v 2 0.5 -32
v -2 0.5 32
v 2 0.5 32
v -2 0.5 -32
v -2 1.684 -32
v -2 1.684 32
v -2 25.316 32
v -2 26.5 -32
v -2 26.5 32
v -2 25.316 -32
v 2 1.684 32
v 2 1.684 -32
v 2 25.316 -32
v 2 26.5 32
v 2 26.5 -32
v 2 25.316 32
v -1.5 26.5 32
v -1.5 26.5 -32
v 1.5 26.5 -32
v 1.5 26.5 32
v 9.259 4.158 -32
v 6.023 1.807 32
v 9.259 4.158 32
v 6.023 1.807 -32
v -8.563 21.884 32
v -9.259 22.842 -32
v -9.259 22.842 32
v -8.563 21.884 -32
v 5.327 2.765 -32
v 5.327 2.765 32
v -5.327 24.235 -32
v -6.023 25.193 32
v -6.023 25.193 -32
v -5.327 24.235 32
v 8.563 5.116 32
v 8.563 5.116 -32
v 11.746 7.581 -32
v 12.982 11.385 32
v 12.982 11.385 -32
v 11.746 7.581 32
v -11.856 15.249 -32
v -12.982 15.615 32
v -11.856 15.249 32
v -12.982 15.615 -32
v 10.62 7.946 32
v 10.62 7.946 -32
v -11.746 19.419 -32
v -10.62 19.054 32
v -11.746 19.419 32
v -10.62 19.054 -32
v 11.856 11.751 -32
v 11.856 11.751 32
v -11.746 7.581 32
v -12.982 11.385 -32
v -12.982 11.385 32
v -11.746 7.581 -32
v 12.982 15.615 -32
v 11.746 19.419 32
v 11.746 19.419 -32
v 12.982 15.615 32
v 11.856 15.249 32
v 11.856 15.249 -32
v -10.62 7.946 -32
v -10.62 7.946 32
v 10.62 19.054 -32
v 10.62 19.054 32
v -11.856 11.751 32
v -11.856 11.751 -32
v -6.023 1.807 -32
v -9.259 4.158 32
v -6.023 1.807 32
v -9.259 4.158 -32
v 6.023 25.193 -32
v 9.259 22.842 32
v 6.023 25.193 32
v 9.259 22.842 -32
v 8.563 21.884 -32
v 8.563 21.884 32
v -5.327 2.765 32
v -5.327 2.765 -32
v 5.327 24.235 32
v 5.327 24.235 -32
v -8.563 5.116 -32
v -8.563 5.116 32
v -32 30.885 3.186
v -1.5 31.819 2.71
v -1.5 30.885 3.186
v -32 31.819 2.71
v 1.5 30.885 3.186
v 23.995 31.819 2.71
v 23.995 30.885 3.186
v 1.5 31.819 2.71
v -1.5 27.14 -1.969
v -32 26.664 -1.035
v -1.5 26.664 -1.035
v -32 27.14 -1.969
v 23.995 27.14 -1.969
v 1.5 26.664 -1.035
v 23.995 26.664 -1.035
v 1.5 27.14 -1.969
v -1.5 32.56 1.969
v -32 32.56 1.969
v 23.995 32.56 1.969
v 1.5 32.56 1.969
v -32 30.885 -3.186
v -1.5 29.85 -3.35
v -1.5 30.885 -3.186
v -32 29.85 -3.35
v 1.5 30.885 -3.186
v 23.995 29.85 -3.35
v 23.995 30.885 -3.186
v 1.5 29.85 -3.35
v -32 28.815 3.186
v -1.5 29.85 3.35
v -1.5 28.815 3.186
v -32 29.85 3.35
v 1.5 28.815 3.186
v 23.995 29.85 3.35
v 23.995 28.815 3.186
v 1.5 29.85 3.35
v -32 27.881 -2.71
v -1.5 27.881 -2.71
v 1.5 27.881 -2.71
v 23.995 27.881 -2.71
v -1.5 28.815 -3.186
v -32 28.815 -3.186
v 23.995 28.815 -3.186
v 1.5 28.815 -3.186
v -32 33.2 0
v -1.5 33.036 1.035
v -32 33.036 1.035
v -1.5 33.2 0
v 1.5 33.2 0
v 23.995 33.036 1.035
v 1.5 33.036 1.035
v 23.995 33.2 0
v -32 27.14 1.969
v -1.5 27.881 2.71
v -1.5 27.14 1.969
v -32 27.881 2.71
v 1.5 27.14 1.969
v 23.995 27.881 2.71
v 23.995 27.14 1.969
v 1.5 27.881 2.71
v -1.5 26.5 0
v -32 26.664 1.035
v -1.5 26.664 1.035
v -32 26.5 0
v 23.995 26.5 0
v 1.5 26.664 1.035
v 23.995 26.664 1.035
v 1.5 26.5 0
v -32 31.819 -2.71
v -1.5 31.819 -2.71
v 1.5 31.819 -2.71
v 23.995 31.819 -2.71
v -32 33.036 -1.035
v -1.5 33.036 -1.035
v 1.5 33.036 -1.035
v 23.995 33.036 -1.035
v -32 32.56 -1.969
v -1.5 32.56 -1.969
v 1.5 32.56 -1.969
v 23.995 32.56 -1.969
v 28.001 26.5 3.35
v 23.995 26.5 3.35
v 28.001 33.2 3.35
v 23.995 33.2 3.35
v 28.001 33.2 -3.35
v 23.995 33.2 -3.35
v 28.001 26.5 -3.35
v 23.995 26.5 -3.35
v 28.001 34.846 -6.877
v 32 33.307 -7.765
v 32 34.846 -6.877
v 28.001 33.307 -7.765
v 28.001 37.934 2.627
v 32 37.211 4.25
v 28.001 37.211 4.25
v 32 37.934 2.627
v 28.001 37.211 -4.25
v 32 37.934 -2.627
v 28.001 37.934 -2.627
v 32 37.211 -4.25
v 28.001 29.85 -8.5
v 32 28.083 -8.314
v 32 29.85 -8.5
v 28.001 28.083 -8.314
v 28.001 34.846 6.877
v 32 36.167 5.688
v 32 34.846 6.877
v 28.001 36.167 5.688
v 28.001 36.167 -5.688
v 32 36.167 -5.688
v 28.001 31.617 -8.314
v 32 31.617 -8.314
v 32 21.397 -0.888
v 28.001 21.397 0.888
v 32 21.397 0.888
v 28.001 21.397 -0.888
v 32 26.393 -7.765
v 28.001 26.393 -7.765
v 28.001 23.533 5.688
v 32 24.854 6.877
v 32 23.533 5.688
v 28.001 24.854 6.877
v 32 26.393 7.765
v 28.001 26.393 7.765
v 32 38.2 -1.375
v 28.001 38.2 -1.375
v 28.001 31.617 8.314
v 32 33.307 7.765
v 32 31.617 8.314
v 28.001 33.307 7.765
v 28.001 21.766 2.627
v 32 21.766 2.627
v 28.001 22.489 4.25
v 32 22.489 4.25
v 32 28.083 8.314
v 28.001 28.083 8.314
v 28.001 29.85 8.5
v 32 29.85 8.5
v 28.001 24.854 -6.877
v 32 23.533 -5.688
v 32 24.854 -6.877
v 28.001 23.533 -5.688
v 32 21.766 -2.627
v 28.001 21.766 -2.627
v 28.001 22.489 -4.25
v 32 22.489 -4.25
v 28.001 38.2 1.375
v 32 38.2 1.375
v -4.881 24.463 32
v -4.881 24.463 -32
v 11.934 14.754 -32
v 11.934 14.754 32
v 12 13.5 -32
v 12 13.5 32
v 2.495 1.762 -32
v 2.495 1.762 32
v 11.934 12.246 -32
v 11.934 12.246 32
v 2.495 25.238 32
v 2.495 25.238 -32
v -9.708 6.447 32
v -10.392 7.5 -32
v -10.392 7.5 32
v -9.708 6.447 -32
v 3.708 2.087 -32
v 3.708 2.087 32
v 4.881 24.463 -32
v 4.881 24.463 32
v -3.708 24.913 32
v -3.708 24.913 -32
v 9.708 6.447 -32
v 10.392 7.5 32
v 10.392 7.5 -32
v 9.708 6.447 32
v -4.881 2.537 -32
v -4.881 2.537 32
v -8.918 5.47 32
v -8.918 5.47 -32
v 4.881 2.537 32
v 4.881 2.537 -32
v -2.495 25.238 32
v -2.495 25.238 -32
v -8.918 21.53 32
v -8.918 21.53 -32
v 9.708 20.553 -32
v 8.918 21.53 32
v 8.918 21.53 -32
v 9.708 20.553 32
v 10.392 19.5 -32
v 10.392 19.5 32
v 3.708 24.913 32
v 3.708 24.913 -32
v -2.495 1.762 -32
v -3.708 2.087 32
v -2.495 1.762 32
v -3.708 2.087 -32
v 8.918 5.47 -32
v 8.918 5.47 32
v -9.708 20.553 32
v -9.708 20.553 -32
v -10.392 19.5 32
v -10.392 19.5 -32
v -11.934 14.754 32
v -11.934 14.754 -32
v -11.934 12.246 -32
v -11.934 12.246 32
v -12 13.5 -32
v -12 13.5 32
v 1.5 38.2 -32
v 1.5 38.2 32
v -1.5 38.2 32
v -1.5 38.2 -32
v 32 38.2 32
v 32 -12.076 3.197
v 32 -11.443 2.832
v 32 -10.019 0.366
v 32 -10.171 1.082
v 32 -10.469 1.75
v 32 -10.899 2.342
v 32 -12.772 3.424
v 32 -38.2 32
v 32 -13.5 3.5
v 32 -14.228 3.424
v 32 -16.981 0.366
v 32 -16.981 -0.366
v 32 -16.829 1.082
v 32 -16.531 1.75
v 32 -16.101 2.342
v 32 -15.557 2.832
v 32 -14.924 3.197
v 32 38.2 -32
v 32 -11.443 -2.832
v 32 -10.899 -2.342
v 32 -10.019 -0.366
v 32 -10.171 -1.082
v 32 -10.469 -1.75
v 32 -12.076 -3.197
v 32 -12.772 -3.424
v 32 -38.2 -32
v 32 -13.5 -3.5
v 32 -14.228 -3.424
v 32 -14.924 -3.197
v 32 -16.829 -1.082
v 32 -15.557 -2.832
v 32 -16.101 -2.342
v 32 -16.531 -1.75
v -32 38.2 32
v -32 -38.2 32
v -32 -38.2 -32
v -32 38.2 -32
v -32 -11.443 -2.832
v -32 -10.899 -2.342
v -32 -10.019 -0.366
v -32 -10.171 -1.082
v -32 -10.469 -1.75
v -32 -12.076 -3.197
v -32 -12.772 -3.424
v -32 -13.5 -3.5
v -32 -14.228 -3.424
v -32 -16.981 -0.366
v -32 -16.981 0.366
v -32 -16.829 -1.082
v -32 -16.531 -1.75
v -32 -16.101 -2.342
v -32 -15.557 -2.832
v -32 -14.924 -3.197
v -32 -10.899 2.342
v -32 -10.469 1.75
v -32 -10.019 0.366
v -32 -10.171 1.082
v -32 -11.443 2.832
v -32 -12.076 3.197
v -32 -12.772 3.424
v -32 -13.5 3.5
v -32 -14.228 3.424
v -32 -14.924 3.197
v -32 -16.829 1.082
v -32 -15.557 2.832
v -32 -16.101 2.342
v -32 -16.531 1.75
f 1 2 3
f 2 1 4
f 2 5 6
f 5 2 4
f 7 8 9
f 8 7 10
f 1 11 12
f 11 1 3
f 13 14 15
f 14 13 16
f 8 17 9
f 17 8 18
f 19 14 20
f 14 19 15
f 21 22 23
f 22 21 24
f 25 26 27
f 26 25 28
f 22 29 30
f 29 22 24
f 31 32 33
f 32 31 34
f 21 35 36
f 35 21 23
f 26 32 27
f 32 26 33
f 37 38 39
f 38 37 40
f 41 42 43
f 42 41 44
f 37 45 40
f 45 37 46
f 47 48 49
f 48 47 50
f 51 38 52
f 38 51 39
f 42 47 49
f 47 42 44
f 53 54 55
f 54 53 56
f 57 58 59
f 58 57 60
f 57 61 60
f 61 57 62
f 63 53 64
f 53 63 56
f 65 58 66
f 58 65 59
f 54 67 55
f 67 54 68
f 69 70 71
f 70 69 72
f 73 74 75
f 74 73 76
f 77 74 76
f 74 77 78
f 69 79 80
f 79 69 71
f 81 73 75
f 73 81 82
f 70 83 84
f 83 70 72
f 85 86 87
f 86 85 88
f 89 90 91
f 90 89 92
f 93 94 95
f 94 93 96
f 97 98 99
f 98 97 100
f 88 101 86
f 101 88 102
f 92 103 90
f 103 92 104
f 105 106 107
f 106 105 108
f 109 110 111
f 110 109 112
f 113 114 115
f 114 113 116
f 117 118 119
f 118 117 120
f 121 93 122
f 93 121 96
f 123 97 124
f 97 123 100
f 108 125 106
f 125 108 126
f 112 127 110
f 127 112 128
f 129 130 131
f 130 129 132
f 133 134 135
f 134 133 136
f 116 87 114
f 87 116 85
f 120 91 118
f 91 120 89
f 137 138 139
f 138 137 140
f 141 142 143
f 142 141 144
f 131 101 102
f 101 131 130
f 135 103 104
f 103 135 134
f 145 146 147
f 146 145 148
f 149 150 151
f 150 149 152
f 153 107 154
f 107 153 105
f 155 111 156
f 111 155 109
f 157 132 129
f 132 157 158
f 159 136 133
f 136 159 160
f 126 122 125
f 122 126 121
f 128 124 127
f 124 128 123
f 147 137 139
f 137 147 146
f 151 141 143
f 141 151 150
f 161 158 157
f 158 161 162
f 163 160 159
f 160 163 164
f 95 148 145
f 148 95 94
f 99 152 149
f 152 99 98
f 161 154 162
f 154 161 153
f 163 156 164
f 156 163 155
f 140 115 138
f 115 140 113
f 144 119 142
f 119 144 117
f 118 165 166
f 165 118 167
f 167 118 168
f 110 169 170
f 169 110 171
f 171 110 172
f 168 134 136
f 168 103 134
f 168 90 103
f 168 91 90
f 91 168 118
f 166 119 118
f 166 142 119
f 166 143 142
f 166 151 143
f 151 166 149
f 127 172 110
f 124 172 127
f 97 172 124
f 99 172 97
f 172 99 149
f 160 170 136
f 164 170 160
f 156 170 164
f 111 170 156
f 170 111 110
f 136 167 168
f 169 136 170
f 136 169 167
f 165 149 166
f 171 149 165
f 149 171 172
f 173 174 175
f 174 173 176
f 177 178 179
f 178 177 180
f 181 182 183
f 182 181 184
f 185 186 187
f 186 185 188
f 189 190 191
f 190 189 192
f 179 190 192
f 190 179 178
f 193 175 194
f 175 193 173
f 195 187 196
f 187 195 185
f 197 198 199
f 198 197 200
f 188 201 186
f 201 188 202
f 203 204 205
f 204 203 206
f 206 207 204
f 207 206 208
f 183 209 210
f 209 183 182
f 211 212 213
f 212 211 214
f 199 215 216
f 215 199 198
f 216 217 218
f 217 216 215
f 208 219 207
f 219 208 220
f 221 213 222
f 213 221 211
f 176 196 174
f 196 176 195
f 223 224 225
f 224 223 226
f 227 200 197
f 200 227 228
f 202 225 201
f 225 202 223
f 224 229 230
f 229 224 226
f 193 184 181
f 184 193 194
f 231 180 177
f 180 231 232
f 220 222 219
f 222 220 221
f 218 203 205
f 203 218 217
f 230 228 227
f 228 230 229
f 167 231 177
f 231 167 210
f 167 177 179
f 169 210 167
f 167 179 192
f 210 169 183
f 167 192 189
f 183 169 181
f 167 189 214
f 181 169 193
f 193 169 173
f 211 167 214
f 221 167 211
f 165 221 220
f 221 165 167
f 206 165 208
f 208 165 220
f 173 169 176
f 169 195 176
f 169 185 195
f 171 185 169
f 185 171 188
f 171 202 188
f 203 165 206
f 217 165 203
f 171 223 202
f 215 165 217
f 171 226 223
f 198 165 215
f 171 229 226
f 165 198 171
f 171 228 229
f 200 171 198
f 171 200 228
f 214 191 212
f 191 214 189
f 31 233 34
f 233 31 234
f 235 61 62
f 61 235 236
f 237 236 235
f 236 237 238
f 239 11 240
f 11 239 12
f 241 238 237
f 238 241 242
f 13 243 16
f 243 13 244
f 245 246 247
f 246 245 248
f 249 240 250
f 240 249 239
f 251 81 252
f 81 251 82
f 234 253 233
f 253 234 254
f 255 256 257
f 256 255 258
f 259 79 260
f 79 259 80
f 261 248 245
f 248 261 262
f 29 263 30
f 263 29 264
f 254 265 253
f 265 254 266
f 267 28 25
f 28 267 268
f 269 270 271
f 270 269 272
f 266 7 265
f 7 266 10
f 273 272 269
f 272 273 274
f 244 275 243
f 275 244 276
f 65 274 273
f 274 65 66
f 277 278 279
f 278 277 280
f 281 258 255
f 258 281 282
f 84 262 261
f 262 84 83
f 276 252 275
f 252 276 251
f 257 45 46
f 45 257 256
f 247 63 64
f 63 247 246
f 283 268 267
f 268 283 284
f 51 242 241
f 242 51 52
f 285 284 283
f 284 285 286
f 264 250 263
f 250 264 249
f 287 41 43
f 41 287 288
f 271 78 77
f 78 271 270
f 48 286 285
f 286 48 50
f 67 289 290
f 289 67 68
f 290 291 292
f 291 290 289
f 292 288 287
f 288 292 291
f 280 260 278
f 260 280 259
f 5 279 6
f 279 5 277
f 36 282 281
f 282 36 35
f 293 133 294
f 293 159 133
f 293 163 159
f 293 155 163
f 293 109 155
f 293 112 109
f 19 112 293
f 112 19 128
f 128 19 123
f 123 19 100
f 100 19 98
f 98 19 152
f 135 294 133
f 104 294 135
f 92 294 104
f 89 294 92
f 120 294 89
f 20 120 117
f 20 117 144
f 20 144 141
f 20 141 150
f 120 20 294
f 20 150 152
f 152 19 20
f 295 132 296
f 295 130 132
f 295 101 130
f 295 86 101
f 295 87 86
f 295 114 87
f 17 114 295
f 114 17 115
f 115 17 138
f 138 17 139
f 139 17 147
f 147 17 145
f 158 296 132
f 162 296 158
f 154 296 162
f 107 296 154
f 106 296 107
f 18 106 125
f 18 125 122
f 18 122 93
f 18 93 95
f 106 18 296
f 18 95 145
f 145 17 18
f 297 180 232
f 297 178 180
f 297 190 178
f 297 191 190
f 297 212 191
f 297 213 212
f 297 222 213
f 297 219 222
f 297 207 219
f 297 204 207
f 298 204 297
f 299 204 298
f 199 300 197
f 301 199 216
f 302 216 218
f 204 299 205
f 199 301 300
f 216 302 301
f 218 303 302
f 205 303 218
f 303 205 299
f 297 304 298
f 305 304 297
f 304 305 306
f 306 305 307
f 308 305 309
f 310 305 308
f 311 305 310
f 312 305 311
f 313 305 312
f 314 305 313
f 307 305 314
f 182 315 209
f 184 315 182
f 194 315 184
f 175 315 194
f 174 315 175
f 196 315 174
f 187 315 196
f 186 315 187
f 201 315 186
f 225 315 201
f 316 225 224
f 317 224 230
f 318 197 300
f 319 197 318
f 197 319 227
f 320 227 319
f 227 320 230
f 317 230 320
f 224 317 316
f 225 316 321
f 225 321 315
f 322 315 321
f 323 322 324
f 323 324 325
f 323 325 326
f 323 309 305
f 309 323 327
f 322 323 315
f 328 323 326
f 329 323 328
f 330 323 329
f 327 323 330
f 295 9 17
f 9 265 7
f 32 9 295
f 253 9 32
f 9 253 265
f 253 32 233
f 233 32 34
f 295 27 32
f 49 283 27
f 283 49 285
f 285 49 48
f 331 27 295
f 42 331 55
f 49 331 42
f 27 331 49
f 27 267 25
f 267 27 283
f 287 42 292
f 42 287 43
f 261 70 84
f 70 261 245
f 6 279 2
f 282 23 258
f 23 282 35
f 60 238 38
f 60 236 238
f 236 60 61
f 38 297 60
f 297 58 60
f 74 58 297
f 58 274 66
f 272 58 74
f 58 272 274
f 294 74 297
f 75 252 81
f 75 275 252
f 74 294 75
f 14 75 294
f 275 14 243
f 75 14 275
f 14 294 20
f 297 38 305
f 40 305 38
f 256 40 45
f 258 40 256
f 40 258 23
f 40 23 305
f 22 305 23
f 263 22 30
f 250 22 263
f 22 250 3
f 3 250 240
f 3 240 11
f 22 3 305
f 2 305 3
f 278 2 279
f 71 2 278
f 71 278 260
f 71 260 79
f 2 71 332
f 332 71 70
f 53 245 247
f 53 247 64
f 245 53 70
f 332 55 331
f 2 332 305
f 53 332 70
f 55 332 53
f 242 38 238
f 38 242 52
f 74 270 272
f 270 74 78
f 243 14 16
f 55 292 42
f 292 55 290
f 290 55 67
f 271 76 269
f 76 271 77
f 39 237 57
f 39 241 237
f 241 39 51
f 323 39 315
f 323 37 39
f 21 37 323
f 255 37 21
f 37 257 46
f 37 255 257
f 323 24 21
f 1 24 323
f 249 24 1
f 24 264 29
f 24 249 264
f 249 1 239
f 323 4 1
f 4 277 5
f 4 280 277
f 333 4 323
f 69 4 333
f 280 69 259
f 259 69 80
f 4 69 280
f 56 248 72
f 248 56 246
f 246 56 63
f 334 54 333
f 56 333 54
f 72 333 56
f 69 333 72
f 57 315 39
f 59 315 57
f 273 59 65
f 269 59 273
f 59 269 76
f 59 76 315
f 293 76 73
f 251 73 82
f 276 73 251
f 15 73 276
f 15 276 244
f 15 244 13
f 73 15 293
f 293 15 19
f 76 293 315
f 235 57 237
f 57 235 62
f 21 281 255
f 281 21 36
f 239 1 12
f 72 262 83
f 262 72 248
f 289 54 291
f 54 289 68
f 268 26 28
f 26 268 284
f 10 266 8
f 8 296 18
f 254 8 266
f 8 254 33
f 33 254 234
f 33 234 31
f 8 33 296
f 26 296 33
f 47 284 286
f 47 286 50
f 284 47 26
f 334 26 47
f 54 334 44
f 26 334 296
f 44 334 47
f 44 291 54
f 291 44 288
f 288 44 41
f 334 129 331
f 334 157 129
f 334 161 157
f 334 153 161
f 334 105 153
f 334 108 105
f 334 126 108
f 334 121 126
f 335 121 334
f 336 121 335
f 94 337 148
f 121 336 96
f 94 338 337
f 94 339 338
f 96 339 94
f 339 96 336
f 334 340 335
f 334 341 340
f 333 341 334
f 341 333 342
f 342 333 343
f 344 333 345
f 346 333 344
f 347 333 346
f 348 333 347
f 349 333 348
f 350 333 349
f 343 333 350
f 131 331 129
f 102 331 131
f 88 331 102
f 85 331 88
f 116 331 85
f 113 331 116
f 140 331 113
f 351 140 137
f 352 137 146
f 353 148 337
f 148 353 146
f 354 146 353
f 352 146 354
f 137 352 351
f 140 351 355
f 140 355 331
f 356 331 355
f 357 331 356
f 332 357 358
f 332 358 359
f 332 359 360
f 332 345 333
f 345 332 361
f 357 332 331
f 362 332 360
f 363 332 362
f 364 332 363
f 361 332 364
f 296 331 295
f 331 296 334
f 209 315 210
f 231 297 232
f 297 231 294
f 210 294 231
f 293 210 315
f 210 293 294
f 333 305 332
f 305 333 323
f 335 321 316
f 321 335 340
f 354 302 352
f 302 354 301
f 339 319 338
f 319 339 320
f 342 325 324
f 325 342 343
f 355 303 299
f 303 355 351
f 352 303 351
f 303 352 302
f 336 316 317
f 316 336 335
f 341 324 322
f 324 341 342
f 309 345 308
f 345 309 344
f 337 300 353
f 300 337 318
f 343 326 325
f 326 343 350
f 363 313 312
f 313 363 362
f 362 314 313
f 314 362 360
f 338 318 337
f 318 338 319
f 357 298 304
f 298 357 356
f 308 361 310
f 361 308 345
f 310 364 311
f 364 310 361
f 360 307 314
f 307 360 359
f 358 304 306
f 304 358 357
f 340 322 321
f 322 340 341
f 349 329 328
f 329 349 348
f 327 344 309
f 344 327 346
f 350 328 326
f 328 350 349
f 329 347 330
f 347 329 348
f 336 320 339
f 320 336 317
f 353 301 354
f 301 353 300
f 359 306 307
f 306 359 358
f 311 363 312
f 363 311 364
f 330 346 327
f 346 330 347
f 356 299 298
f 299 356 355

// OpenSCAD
// file: lib/boltDim.scad
/*
    Mounting Blocks to build a camera boom.

    Copyright (C) 2021 John Winans

    This program is free software: you can redistribute it and/or modify
    it under the terms of the GNU General Public License as published by
    the Free Software Foundation, either version 3 of the License, or
    (at your option) any later version.

    This program is distributed in the hope that it will be useful,
    but WITHOUT ANY WARRANTY; without even the implied warranty of
    MERCHANTABILITY or FITNESS FOR A PARTICULAR PURPOSE.  See the
    GNU General Public License for more details.

    You should have received a copy of the GNU General Public License
    along with this program.  If not, see <https://www.gnu.org/licenses/>.
*/

bolt_dim_M2_dia = 3;		// for M2 bolt loose fit
bolt_dim_M2_tap = 2.3;		// for self-tapping a M2 bolt
bolt_dim_M2_head_dia = 4.6;// diameter for a crown countersink

bolt_dim_M25_dia = 3.5;		// for M2.5 bolt loose fit
bolt_dim_M25_tap = 2.6;		// for self-tapping a M2.5 bolt
bolt_dim_M25_head_dia = 6;	// diameter for a crown countersink

bolt_dim_M3_dia = 3.6;		// M3 bolt loose fit
bolt_dim_M3_tap = 3.1;		// for self-tapping M3 bolt
bolt_dim_M3_head_dia = 6.5;	// diameter for a crown countersink

bolt_dim_M5_dia = 5.4;		// for M5 bolt loose fit
bolt_dim_M5_tap = 5;		// for self-tapping a M5 bolt
bolt_dim_M5_head_dia = 9;	// diameter for a crown countersink

nut_dim_M5_DIN985 = 9.6;	// diameter for a hex hole to retain am M5 myloc


bolt_dim_quarter_dia = 6.7;	// for 1/4" bolt loose fit
bolt_dim_quarter_carriage_neck_depth = 4;	// neck length
// file: lib/clamp.scad
/*
	Mounting Blocks to build a camera boom.

    Copyright (C) 2021 John Winans

    This program is free software: you can redistribute it and/or modify
    it under the terms of the GNU General Public License as published by
    the Free Software Foundation, either version 3 of the License, or
    (at your option) any later version.

    This program is distributed in the hope that it will be useful,
    but WITHOUT ANY WARRANTY; without even the implied warranty of
    MERCHANTABILITY or FITNESS FOR A PARTICULAR PURPOSE.  See the
    GNU General Public License for more details.

    You should have received a copy of the GNU General Public License
    along with this program.  If not, see <https://www.gnu.org/licenses/>.
*/

include <boltDim.scad>


//********************************************************
// A pipe & bolt holes for a pipe clamp.
//********************************************************
module clamp_neg(
    relief_slot,        // how far from the edge of the pipe should the relief slot go?
    pipe_length, 
    pipe_diameter,
    clamp_bolt_length,    // used to determine the length of the clamp bolt
    clamp_bolt_dia,
    clamp_bolt_neck_depth,
    clamp_bolt_clearance,
	clamp_bolt_countersink_depth=0,
	clamp_bolt_countersink_dia=0,
    rib=false, 
    stripe=true
    )
{
    clamp_bolt_offset = pipe_diameter/2+clamp_bolt_dia/2+clamp_bolt_clearance;

    cz = pipe_length+.01;
    
    // the pipe hole
    cylinder(d=pipe_diameter, h=cz+.01, center=true, $fn=60);
    
    if (rib)
    {
        // rib it
        rh=2;
        rs=4;
        for (z=[-cz/2+rh*.5+1 : rs : cz/2]) // XXX fudge start to center it
            translate([0,0,z])
                cylinder(d=pipe_diameter+1, h=rh, center=true, $fn=60);
    }
    
    if (stripe)
    {
        // stripe it
        //rh=1.5;
        rh=4;
        rt=360/10;
        for (theta=[90:rt:2690])
            rotate([0,0,theta]) cube([pipe_diameter+2, rh, cz+.01], center=true);
    }
    
    // releif notch
    translate([0,pipe_diameter/2+relief_slot/2,0]) cube([3, relief_slot+.01, cz+.01], center=true);
    
    // clamp bolt
    translate([0,clamp_bolt_offset,0])
    {
        rotate([0,90,0]) 
        cylinder(d=clamp_bolt_dia, h=clamp_bolt_length+.01, $fn=20, center=true);
    
        // square for carriage bolt head
        translate([clamp_bolt_length/2-clamp_bolt_neck_depth/2-clamp_bolt_countersink_depth,0,0])
            cube([clamp_bolt_neck_depth+.01, clamp_bolt_dia,clamp_bolt_dia], center=true);
		translate([clamp_bolt_length/2-clamp_bolt_countersink_depth+.001,0,0])
			rotate([0,90,0]) cylinder(d=clamp_bolt_countersink_dia, h=clamp_bolt_countersink_depth, $fn=30);
    }
}
// main file
/*
    Mounting Blocks to build a camera boom.

    Copyright (C) 2021 John Winans

    This program is free software: you can redistribute it and/or modify
    it under the terms of the GNU General Public License as published by
    the Free Software Foundation, either version 3 of the License, or
    (at your option) any later version.

    This program is distributed in the hope that it will be useful,
    but WITHOUT ANY WARRANTY; without even the implied warranty of
    MERCHANTABILITY or FITNESS FOR A PARTICULAR PURPOSE.  See the
    GNU General Public License for more details.

    You should have received a copy of the GNU General Public License
    along with this program.  If not, see <https://www.gnu.org/licenses/>.
*/

include <lib/clamp.scad>


//********************************************************
// The size of the hole for the pipe(s)
pipe_diameter=24;       // 3/4" conduit

block_c_bolt_pipe_clearance=1;
block_c_bolt_inset=5;	// from clamp-bolt to the end of the block

block_inset=40;			// space from pipe-edge to the block-edge 

pipe_gap=3;				// distance between pipes

clamp_bolt_countersink_depth=4;
clamp_bolt_countersink_dia=17;

mount_bolt_dia=7;		// suitable for 1/4" lag screw


// calculate the dimensions of the block using the above config variables

cx = pipe_diameter+block_inset;   

cbd=bolt_dim_quarter_dia;       // clamp bolt diameter
cz=cx;

cbl=cx;                         // length of the clamp bolt bore
cbnd=bolt_dim_quarter_carriage_neck_depth;

cbc=1;
rs=cbd+block_c_bolt_inset+cbc;       // relief slot width

cy = pipe_diameter*2+pipe_gap+rs*2;



crossblock();


/**
* A helper for creating the negative space for the pipe clamp.
**********************************************************************************/
module cn()
{
    clamp_neg(
        clamp_bolt_length=cbl,
        clamp_bolt_dia=cbd,
        clamp_bolt_neck_depth=cbnd,
		clamp_bolt_countersink_depth=clamp_bolt_countersink_depth,
		clamp_bolt_countersink_dia=clamp_bolt_countersink_dia,
        relief_slot=rs,
        pipe_length=cz,
        pipe_diameter=pipe_diameter,
        clamp_bolt_clearance=cbc);
}


/**
* A crossblock.
**********************************************************************************/
module crossblock()
{
	pipe_offset=pipe_diameter/2+pipe_gap/2;

    difference()
    {
		cube([cx,cy,cz], center=true);
        translate([0,pipe_offset,0]) cn();
		translate([0,-pipe_offset,0]) rotate([0,90,0]) cylinder(d=mount_bolt_dia, h=cz+1, center=true, $fn=30);
    }
}
